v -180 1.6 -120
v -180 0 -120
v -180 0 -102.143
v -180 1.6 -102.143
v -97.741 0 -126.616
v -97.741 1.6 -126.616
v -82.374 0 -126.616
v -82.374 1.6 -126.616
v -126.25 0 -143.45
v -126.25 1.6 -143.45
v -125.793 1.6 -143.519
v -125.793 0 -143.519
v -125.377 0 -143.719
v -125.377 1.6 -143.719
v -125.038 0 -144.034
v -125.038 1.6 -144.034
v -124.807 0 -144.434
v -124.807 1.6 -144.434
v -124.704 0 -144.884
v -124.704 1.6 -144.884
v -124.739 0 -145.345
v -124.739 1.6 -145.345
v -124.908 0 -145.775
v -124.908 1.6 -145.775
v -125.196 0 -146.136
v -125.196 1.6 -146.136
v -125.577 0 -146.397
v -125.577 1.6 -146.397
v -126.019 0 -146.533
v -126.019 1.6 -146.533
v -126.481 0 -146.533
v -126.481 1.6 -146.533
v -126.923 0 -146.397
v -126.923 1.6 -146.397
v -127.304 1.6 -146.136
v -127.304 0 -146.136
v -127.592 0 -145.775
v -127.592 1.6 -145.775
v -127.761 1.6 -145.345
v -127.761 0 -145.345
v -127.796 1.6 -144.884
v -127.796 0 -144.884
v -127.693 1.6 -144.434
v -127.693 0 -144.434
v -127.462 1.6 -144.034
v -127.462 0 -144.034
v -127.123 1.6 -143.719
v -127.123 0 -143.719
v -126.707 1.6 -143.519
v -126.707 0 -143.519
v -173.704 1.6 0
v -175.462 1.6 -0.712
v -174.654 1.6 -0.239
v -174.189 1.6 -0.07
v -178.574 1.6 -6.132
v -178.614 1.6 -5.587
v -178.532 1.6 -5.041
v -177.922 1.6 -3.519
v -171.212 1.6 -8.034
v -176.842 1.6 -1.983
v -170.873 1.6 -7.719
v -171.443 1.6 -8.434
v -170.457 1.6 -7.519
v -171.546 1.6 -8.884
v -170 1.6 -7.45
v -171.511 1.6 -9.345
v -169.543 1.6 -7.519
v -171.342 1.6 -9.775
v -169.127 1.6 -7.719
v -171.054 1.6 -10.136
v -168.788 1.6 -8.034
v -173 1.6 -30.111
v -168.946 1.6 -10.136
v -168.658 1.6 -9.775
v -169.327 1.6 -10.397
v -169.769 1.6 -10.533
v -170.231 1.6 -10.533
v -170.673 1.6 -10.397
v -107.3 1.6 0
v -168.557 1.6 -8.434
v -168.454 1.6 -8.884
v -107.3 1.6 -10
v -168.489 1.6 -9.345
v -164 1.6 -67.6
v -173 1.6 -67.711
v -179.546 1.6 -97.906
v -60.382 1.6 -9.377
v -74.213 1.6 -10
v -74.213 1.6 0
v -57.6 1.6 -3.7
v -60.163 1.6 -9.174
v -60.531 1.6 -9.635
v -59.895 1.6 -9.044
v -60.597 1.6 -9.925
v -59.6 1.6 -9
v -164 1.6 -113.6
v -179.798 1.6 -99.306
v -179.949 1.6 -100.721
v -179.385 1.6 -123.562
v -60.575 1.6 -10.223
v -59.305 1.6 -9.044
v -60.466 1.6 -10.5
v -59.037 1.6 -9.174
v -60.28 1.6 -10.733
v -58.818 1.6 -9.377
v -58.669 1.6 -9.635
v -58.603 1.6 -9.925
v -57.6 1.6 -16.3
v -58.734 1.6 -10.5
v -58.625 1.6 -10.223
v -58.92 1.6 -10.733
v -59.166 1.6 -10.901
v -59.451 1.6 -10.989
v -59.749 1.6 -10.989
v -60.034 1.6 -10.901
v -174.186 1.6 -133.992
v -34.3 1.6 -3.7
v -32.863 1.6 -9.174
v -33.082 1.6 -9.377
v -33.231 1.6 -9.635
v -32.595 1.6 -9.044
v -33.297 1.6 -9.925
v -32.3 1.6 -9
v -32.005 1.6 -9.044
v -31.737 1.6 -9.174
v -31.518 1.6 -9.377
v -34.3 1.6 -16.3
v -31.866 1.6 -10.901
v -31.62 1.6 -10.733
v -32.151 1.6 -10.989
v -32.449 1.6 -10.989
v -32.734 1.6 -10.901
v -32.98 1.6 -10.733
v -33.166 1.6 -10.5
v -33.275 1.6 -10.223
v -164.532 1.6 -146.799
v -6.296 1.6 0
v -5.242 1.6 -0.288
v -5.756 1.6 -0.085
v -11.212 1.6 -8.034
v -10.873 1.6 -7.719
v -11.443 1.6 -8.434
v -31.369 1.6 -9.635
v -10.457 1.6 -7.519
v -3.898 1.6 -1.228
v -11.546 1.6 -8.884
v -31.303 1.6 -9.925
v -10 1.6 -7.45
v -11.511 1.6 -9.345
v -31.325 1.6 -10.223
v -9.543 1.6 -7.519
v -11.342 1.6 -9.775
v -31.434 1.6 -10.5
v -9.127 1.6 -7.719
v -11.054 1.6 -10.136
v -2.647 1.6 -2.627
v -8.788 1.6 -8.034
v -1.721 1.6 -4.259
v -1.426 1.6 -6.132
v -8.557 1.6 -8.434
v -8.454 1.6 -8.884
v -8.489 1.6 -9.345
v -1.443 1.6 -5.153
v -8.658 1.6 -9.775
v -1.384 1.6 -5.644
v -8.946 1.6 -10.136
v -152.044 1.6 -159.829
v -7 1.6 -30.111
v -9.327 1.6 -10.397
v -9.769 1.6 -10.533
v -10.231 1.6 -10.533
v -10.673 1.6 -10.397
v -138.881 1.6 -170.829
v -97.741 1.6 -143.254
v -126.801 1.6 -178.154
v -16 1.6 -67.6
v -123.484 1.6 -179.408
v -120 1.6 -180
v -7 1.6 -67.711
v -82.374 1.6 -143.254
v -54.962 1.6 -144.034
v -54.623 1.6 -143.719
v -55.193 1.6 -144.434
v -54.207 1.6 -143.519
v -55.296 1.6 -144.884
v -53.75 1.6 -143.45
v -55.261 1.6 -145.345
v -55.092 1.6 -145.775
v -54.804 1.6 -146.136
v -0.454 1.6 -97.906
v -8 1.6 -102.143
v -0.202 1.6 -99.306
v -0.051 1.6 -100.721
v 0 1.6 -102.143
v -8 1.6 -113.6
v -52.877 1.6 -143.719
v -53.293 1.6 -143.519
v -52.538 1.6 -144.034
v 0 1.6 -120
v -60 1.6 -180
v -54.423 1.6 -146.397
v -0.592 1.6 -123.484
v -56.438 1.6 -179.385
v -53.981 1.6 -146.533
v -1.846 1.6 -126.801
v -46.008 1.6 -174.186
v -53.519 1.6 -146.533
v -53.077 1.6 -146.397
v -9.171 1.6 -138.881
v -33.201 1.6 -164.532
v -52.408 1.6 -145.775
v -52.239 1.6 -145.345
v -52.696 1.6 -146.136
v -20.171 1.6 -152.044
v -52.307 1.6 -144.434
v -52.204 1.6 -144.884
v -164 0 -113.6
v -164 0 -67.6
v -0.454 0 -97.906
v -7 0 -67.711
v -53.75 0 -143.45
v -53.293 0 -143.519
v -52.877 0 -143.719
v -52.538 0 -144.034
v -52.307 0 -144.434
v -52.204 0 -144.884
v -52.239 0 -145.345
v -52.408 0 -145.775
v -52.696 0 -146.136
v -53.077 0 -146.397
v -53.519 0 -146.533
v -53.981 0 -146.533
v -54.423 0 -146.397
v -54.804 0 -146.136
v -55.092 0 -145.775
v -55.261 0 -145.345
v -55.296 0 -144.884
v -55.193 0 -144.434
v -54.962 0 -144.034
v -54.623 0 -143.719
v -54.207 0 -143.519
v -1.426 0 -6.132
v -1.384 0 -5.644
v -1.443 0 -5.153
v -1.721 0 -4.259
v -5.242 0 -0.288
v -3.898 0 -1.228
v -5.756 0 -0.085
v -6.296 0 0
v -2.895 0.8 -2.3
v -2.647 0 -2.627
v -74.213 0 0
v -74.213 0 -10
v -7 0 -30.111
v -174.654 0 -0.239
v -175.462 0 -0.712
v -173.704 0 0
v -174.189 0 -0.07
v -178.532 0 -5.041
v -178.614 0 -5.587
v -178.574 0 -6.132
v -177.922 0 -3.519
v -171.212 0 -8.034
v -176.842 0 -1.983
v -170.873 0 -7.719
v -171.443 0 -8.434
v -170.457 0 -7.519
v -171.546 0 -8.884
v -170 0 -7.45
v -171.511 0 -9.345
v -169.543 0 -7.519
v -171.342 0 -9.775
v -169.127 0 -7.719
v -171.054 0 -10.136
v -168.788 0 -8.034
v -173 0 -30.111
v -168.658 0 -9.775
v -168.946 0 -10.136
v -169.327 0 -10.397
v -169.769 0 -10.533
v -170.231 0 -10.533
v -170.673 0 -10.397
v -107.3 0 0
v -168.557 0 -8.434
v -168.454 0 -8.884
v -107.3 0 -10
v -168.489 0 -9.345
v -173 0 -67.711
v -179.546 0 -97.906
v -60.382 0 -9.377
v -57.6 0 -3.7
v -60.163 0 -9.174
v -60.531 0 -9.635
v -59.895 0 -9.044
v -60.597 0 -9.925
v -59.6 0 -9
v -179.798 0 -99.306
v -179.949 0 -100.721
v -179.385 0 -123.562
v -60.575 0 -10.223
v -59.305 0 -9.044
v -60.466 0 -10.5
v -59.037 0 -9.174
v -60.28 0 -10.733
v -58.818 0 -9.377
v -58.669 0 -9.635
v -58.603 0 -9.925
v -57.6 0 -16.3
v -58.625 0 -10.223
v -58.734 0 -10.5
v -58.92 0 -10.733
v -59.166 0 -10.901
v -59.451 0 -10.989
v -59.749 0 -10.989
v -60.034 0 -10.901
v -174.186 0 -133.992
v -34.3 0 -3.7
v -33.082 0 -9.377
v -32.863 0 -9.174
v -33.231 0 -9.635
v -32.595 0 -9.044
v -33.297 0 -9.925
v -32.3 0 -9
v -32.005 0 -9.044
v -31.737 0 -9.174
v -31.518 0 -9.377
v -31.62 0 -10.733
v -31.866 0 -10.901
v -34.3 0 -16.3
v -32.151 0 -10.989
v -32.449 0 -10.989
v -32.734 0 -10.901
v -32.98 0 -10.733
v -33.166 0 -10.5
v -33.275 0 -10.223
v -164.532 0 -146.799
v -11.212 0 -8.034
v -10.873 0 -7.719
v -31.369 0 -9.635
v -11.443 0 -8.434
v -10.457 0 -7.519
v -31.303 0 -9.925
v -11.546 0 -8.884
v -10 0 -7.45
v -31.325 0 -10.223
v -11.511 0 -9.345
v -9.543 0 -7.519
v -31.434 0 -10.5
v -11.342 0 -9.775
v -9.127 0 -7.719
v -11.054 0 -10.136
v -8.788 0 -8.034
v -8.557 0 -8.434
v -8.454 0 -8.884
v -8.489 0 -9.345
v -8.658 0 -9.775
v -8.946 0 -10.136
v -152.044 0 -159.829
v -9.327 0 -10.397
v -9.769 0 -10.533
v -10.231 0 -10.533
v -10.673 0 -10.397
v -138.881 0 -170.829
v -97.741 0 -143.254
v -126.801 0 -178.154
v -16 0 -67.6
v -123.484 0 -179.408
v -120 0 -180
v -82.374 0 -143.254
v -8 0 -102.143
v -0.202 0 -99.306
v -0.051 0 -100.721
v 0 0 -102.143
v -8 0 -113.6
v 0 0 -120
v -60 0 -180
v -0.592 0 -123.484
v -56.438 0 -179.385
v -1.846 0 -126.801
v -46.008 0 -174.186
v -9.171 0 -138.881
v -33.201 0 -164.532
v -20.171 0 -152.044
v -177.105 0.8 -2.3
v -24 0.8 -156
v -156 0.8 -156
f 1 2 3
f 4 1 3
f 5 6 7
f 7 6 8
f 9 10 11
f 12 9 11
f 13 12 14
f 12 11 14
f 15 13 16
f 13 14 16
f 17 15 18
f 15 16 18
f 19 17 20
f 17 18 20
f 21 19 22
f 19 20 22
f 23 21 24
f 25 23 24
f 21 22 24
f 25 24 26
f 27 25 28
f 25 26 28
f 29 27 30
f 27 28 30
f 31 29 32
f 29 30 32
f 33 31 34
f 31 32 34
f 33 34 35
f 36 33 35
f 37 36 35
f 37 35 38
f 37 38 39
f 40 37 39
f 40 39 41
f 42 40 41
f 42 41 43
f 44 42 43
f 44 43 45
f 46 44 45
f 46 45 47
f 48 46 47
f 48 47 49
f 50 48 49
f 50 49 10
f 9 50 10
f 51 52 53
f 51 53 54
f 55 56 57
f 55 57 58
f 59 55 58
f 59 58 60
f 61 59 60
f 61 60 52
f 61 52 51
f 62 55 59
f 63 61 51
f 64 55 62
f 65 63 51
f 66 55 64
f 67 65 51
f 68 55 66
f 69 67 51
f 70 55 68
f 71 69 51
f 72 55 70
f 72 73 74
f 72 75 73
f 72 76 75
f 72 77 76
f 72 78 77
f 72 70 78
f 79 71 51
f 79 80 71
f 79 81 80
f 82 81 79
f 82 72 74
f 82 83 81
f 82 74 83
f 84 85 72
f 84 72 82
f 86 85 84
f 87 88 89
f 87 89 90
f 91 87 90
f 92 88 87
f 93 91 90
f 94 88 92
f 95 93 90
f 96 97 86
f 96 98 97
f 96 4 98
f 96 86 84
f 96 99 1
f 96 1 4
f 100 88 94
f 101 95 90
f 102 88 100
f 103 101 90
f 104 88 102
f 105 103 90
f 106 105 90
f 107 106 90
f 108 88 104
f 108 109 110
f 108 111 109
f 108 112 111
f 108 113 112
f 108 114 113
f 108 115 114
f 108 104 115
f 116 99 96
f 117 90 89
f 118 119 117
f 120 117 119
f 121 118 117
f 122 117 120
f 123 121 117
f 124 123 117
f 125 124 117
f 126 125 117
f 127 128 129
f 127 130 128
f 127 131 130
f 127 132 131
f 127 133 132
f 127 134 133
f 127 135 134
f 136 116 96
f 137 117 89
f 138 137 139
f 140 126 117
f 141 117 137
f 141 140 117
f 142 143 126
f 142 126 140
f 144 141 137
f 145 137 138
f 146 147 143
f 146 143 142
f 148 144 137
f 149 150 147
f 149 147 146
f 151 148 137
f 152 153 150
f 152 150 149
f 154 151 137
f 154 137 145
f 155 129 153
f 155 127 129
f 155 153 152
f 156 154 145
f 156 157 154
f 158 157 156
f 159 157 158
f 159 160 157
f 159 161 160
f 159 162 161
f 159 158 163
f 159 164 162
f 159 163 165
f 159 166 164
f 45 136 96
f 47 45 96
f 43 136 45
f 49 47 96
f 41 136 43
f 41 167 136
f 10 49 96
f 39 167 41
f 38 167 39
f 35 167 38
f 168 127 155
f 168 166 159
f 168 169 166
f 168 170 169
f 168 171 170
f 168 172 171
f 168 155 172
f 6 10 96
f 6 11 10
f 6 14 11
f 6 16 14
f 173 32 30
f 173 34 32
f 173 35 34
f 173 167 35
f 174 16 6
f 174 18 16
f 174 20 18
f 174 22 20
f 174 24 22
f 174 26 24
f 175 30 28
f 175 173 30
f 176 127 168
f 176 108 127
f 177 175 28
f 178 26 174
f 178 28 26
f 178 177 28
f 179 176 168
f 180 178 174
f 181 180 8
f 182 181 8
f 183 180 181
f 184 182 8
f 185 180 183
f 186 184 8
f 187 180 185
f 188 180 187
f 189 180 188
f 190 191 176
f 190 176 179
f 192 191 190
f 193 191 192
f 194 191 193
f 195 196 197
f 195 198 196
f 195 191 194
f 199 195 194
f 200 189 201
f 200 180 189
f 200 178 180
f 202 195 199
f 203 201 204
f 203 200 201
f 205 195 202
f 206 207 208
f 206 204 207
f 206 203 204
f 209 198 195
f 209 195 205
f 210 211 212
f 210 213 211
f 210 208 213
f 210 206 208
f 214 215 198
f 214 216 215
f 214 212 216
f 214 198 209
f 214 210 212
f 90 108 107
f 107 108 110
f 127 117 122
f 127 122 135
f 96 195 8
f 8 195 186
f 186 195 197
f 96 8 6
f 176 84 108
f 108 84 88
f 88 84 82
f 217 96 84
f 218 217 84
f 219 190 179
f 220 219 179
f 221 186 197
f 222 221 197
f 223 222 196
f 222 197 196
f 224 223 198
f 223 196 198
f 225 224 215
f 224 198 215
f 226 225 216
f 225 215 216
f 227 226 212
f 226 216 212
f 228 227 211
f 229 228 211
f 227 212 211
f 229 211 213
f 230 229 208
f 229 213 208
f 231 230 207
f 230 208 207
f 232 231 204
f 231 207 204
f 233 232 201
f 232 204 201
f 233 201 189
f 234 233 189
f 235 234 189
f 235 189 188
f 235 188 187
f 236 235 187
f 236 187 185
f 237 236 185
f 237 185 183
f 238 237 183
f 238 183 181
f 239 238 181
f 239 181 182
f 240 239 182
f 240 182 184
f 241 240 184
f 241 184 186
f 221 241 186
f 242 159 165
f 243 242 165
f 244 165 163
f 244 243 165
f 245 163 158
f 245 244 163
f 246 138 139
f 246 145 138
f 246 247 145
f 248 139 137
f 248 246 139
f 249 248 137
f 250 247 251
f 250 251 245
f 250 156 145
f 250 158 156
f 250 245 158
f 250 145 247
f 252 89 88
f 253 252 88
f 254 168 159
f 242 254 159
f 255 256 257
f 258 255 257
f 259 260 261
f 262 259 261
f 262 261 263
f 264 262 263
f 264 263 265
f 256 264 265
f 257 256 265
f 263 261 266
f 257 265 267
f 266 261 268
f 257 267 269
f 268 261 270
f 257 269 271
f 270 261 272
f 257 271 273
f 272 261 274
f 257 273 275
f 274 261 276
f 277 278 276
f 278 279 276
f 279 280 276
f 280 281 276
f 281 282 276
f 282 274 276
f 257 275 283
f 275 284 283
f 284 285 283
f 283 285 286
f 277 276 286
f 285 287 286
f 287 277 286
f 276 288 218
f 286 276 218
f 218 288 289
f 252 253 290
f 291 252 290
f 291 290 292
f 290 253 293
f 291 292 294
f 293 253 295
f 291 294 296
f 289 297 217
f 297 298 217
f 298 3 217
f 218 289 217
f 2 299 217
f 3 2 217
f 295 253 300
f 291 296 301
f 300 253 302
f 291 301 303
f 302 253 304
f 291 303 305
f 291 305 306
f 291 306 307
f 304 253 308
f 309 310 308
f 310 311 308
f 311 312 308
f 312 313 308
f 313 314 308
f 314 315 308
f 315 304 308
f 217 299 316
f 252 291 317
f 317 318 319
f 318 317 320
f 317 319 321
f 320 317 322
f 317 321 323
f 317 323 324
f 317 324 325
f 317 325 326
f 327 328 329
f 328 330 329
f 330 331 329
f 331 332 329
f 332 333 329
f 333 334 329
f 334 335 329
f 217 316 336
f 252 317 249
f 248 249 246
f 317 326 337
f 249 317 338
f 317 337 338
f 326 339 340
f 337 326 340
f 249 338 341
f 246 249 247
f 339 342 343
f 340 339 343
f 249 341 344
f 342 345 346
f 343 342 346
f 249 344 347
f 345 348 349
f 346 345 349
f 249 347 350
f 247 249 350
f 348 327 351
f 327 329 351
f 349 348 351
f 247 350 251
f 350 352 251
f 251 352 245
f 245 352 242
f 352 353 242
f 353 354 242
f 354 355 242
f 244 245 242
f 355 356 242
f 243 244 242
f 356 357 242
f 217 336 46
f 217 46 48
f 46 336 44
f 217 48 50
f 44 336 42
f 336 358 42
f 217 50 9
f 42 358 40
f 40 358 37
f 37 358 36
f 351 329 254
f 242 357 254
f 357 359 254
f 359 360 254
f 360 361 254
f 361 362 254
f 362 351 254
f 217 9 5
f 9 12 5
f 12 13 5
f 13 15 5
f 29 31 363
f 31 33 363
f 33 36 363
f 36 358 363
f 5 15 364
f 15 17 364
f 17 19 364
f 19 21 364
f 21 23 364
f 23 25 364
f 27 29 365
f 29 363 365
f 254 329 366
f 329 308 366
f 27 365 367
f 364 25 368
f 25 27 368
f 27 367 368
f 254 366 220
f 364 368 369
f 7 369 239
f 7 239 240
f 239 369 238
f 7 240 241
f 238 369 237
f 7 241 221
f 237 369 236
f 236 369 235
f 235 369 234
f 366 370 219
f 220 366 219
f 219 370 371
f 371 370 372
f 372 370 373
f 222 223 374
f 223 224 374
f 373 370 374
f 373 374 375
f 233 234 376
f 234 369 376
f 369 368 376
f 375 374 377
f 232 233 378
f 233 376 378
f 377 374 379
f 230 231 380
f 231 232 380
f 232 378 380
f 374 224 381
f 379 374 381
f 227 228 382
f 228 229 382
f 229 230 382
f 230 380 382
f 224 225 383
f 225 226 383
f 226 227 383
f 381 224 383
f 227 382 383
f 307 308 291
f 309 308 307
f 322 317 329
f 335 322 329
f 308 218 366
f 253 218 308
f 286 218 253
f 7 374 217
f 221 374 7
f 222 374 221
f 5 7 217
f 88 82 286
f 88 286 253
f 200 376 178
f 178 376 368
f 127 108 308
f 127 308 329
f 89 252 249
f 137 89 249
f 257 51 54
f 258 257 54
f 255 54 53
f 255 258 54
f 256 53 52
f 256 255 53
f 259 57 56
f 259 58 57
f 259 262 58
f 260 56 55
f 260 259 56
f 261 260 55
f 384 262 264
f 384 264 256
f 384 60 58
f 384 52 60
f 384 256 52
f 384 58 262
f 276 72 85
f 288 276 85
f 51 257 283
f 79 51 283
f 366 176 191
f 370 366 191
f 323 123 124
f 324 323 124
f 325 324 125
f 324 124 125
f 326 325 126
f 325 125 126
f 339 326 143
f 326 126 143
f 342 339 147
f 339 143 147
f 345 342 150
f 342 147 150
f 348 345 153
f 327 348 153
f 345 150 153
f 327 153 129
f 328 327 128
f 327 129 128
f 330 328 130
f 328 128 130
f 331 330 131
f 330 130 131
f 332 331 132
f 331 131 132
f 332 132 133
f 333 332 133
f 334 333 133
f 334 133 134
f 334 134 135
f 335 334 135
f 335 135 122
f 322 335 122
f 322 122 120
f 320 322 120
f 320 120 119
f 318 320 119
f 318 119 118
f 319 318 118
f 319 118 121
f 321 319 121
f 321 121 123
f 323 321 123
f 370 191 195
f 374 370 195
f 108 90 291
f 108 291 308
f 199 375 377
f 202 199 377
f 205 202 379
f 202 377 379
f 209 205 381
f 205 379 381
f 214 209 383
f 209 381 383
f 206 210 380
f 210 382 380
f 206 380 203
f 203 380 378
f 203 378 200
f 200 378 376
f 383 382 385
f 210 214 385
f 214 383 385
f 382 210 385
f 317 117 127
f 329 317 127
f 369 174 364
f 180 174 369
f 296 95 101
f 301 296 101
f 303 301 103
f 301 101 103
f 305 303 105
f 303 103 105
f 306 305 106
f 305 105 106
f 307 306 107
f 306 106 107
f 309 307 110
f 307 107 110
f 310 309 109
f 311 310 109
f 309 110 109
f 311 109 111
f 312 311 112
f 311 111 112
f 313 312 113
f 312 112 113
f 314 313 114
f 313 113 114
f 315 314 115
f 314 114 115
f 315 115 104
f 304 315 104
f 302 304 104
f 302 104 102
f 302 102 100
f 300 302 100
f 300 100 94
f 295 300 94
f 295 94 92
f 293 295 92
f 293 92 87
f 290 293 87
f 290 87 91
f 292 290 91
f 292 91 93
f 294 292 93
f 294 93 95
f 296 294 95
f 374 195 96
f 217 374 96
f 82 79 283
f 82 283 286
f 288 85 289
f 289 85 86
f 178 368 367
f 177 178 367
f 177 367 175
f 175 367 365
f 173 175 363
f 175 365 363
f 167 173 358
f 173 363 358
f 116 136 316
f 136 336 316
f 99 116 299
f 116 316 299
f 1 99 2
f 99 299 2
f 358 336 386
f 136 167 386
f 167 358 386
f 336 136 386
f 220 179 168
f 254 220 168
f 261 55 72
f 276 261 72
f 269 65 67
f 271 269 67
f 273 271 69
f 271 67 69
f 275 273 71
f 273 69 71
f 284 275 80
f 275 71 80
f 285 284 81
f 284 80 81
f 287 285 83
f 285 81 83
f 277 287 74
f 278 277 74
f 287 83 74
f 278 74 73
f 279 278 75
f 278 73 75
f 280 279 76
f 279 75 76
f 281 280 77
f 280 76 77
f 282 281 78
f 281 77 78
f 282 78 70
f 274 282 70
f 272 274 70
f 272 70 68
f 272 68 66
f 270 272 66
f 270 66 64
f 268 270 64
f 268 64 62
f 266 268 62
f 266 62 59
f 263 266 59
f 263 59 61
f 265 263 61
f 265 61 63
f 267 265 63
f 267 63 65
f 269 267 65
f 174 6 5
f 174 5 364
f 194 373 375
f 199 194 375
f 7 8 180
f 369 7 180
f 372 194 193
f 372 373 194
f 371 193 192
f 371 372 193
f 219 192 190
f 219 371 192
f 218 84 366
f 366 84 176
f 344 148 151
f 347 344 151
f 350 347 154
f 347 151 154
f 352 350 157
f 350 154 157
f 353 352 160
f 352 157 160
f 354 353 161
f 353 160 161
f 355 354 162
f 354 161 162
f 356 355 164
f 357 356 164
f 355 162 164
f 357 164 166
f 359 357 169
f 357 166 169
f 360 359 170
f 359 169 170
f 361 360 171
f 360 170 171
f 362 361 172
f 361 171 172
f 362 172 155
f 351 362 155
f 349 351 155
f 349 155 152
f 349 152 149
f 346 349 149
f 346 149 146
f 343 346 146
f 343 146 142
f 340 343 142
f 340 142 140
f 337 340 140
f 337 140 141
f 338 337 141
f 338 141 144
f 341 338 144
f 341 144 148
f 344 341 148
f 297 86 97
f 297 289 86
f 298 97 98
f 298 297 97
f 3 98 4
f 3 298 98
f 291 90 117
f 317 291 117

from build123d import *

# Parameters (mm, degrees)
SKETCH1_W           = 80
SKETCH1_H           = 30
SKETCH1_W_2         = 50
BOSS_EXTRUDE1_DEPTH = 1.6
FILLET1_SIZE        = 60
SKETCH6_W           = 80
SKETCH6_H           = 30
CUT_EXTRUDE1_DEPTH  = 10
FILLET3_R           = 20
CUT_EXTRUDE3_REACH  = 256.563
SKETCH9_W           = 15.367
SKETCH9_H           = 16.637
CUT_EXTRUDE5_REACH  = 256.563
SKETCH11_R          = 1.55
SKETCH11_R_2        = 1
SKETCH11_W          = 23.3
SKETCH11_H          = 12.6
CUT_EXTRUDE6_REACH  = 256.563
SKETCH12_W          = 33.087121525
SKETCH12_H          = 10


with BuildPart() as part:
    # Sketch1 → Boss-Extrude1 (new body)
    with BuildSketch(Plane(origin=(0, 0, 0), x_dir=(1, 0, 0), z_dir=(0, 1, 0))):
        with Locations((-90, -15)):
            Rectangle(SKETCH1_W, SKETCH1_H)
        Polygon((0, 180), (-180, 180), (-180, 30), (-130, 30), (-50, 30), (0, 30), align=None)
        with Locations((-25, 15)):
            Rectangle(SKETCH1_W_2, SKETCH1_H)
        with Locations((-155, 15)):
            Rectangle(SKETCH1_W_2, SKETCH1_H)
        with Locations((-90, 15)):
            Rectangle(SKETCH1_W, SKETCH1_H)
    extrude(amount=BOSS_EXTRUDE1_DEPTH)

    # Fillet1
    # a fillet whose section is not a circle: 60 mm, written as the material it takes off along each edge
    with BuildSketch(Plane(origin=(0, -150, -180), x_dir=(0, 0, 1), z_dir=(0, 1, 0)), Plane(origin=(-180, -150, -180), x_dir=(1, 0, 0), z_dir=(0, 1, 0))) as fillet1_piece_1:
        with BuildLine():
            Bezier((FILLET1_SIZE, 0), (0, 0), (0, -FILLET1_SIZE), weights=[1, 0.25, 1])
            Line((0, -FILLET1_SIZE), (0, 0))
            Line((0, 0), (FILLET1_SIZE, 0))
        make_face()
    extrude(amount=301.6, mode=Mode.SUBTRACT)

    # Sketch6 → Cut-Extrude1 (cut)
    with BuildSketch(Plane(origin=(0, 1.6, 0), x_dir=(1, 0, 0), z_dir=(0, 1, 0))):
        with Locations((-90, -15)):
            Rectangle(SKETCH6_W, SKETCH6_H)
        Polygon((-180, 100), (-180, 0), (-173, 30.1112758), (-173, 67.7112758), align=None)
        Polygon((-7, 30.1112758), (0, 0), (0, 100), (-7, 67.7112758), align=None)
    extrude(amount=-CUT_EXTRUDE1_DEPTH, mode=Mode.SUBTRACT)

    # Fillet2
    # a fillet whose section is not a circle: 5 mm, written as the material it takes off along each edge
    with BuildSketch(Plane(origin=(-180, -15.739211431, 0), x_dir=(1, 0, 0), z_dir=(0, 1, 0)), Plane(origin=(0, -15.739211431, 0), x_dir=(-0.22643302171939195, 0, -0.9740267381725335), z_dir=(0, 1, 0))) as fillet2_piece_1:
        with BuildLine():
            Bezier((6.295684572, 0), (0, 0), (1.425550882, 6.132165109), weights=[1, 0.333333333, 1])
            Line((1.425550882, 6.132165109), (0, 0))
            Line((0, 0), (6.295684572, 0))
        make_face()
    extrude(amount=33.078422862, mode=Mode.SUBTRACT)

    # Fillet3
    fillet3_edges = [part.edges().sort_by_distance(p)[0] for p in [
        (0, 0.8, -100),
        (-180, 0.8, -100),
    ]]
    fillet(fillet3_edges, radius=FILLET3_R)

    # Sketch9 → Cut-Extrude3 (cut, up to next)
    with BuildSketch(Plane(origin=(0, 1.6, 0), x_dir=(1, 0, 0), z_dir=(0, 1, 0)), mode=Mode.PRIVATE) as cut_extrude3_sk1:
        Polygon((-164, 113.6), (-164, 67.6), (-16, 67.6), (-8, 102.143047988), (-8, 113.6), align=None)
    cut_extrude3_tool1 = extrude(cut_extrude3_sk1.sketch, amount=-CUT_EXTRUDE3_REACH, mode=Mode.PRIVATE) & part.part
    # Sketch9 → Cut-Extrude3 (cut, up to next)
    with BuildSketch(Plane(origin=(0, 1.6, 0), x_dir=(1, 0, 0), z_dir=(0, 1, 0)), mode=Mode.PRIVATE) as cut_extrude3_sk2:
        with Locations((-90.0575, 134.935)):
            Rectangle(SKETCH9_W, SKETCH9_H)
    cut_extrude3_tool2 = extrude(cut_extrude3_sk2.sketch, amount=-CUT_EXTRUDE3_REACH, mode=Mode.PRIVATE) & part.part
    add(cut_extrude3_tool1.solids().sort_by_distance((-87.479003, 1.6, -90.825495))[0], mode=Mode.SUBTRACT)
    add(cut_extrude3_tool2.solids().sort_by_distance((-90.0575, 1.6, -134.935))[0], mode=Mode.SUBTRACT)

    # Sketch11 → Cut-Extrude5 (cut, up to next)
    with BuildSketch(Plane(origin=(0, 1.6, 0), x_dir=(1, 0, 0), z_dir=(0, 1, 0)), mode=Mode.PRIVATE) as cut_extrude5_sk1:
        with Locations(Location((-170, 9, 0), (0, 0, 270))):
            Circle(SKETCH11_R)
    cut_extrude5_tool1 = extrude(cut_extrude5_sk1.sketch, amount=-CUT_EXTRUDE5_REACH, mode=Mode.PRIVATE) & part.part
    # Sketch11 → Cut-Extrude5 (cut, up to next)
    with BuildSketch(Plane(origin=(0, 1.6, 0), x_dir=(1, 0, 0), z_dir=(0, 1, 0)), mode=Mode.PRIVATE) as cut_extrude5_sk2:
        with Locations(Location((-126.25, 145, 0), (0, 0, 270))):
            Circle(SKETCH11_R)
    cut_extrude5_tool2 = extrude(cut_extrude5_sk2.sketch, amount=-CUT_EXTRUDE5_REACH, mode=Mode.PRIVATE) & part.part
    # Sketch11 → Cut-Extrude5 (cut, up to next)
    with BuildSketch(Plane(origin=(0, 1.6, 0), x_dir=(1, 0, 0), z_dir=(0, 1, 0)), mode=Mode.PRIVATE) as cut_extrude5_sk3:
        with Locations(Location((-10, 9, 0), (0, 0, 270))):
            Circle(SKETCH11_R)
    cut_extrude5_tool3 = extrude(cut_extrude5_sk3.sketch, amount=-CUT_EXTRUDE5_REACH, mode=Mode.PRIVATE) & part.part
    # Sketch11 → Cut-Extrude5 (cut, up to next)
    with BuildSketch(Plane(origin=(0, 1.6, 0), x_dir=(1, 0, 0), z_dir=(0, 1, 0)), mode=Mode.PRIVATE) as cut_extrude5_sk4:
        with Locations(Location((-53.75, 145, 0), (0, 0, 270))):
            Circle(SKETCH11_R)
    cut_extrude5_tool4 = extrude(cut_extrude5_sk4.sketch, amount=-CUT_EXTRUDE5_REACH, mode=Mode.PRIVATE) & part.part
    # Sketch11 → Cut-Extrude5 (cut, up to next)
    with BuildSketch(Plane(origin=(0, 1.6, 0), x_dir=(1, 0, 0), z_dir=(0, 1, 0)), mode=Mode.PRIVATE) as cut_extrude5_sk5:
        with Locations(Location((-32.3, 10, 0), (0, 0, 270))):
            Circle(SKETCH11_R_2)
    cut_extrude5_tool5 = extrude(cut_extrude5_sk5.sketch, amount=-CUT_EXTRUDE5_REACH, mode=Mode.PRIVATE) & part.part
    # Sketch11 → Cut-Extrude5 (cut, up to next)
    with BuildSketch(Plane(origin=(0, 1.6, 0), x_dir=(1, 0, 0), z_dir=(0, 1, 0)), mode=Mode.PRIVATE) as cut_extrude5_sk6:
        with Locations(Location((-59.6, 10, 0), (0, 0, 270))):
            Circle(SKETCH11_R_2)
    cut_extrude5_tool6 = extrude(cut_extrude5_sk6.sketch, amount=-CUT_EXTRUDE5_REACH, mode=Mode.PRIVATE) & part.part
    # Sketch11 → Cut-Extrude5 (cut, up to next)
    with BuildSketch(Plane(origin=(0, 1.6, 0), x_dir=(1, 0, 0), z_dir=(0, 1, 0)), mode=Mode.PRIVATE) as cut_extrude5_sk7:
        with Locations((-45.95, 10)):
            Rectangle(SKETCH11_W, SKETCH11_H)
    cut_extrude5_tool7 = extrude(cut_extrude5_sk7.sketch, amount=-CUT_EXTRUDE5_REACH, mode=Mode.PRIVATE) & part.part
    add(cut_extrude5_tool1.solids().sort_by_distance((-170, 1.6, -9))[0], mode=Mode.SUBTRACT)
    add(cut_extrude5_tool2.solids().sort_by_distance((-126.25, 1.6, -145))[0], mode=Mode.SUBTRACT)
    add(cut_extrude5_tool3.solids().sort_by_distance((-10, 1.6, -9))[0], mode=Mode.SUBTRACT)
    add(cut_extrude5_tool4.solids().sort_by_distance((-53.75, 1.6, -145))[0], mode=Mode.SUBTRACT)
    add(cut_extrude5_tool5.solids().sort_by_distance((-32.3, 1.6, -10))[0], mode=Mode.SUBTRACT)
    add(cut_extrude5_tool6.solids().sort_by_distance((-59.6, 1.6, -10))[0], mode=Mode.SUBTRACT)
    add(cut_extrude5_tool7.solids().sort_by_distance((-45.95, 1.6, -10))[0], mode=Mode.SUBTRACT)

    # Sketch12 → Cut-Extrude6 (cut, up to next)
    with BuildSketch(Plane(origin=(0, 1.6, 0), x_dir=(1, 0, 0), z_dir=(0, 1, 0)), mode=Mode.PRIVATE) as cut_extrude6_sk1:
        with Locations((-90.756439238, 5)):
            Rectangle(SKETCH12_W, SKETCH12_H)
    cut_extrude6_tool1 = extrude(cut_extrude6_sk1.sketch, amount=-CUT_EXTRUDE6_REACH, mode=Mode.PRIVATE) & part.part
    add(cut_extrude6_tool1.solids().sort_by_distance((-90.756439, 1.6, -5))[0], mode=Mode.SUBTRACT)


solid = part.part
